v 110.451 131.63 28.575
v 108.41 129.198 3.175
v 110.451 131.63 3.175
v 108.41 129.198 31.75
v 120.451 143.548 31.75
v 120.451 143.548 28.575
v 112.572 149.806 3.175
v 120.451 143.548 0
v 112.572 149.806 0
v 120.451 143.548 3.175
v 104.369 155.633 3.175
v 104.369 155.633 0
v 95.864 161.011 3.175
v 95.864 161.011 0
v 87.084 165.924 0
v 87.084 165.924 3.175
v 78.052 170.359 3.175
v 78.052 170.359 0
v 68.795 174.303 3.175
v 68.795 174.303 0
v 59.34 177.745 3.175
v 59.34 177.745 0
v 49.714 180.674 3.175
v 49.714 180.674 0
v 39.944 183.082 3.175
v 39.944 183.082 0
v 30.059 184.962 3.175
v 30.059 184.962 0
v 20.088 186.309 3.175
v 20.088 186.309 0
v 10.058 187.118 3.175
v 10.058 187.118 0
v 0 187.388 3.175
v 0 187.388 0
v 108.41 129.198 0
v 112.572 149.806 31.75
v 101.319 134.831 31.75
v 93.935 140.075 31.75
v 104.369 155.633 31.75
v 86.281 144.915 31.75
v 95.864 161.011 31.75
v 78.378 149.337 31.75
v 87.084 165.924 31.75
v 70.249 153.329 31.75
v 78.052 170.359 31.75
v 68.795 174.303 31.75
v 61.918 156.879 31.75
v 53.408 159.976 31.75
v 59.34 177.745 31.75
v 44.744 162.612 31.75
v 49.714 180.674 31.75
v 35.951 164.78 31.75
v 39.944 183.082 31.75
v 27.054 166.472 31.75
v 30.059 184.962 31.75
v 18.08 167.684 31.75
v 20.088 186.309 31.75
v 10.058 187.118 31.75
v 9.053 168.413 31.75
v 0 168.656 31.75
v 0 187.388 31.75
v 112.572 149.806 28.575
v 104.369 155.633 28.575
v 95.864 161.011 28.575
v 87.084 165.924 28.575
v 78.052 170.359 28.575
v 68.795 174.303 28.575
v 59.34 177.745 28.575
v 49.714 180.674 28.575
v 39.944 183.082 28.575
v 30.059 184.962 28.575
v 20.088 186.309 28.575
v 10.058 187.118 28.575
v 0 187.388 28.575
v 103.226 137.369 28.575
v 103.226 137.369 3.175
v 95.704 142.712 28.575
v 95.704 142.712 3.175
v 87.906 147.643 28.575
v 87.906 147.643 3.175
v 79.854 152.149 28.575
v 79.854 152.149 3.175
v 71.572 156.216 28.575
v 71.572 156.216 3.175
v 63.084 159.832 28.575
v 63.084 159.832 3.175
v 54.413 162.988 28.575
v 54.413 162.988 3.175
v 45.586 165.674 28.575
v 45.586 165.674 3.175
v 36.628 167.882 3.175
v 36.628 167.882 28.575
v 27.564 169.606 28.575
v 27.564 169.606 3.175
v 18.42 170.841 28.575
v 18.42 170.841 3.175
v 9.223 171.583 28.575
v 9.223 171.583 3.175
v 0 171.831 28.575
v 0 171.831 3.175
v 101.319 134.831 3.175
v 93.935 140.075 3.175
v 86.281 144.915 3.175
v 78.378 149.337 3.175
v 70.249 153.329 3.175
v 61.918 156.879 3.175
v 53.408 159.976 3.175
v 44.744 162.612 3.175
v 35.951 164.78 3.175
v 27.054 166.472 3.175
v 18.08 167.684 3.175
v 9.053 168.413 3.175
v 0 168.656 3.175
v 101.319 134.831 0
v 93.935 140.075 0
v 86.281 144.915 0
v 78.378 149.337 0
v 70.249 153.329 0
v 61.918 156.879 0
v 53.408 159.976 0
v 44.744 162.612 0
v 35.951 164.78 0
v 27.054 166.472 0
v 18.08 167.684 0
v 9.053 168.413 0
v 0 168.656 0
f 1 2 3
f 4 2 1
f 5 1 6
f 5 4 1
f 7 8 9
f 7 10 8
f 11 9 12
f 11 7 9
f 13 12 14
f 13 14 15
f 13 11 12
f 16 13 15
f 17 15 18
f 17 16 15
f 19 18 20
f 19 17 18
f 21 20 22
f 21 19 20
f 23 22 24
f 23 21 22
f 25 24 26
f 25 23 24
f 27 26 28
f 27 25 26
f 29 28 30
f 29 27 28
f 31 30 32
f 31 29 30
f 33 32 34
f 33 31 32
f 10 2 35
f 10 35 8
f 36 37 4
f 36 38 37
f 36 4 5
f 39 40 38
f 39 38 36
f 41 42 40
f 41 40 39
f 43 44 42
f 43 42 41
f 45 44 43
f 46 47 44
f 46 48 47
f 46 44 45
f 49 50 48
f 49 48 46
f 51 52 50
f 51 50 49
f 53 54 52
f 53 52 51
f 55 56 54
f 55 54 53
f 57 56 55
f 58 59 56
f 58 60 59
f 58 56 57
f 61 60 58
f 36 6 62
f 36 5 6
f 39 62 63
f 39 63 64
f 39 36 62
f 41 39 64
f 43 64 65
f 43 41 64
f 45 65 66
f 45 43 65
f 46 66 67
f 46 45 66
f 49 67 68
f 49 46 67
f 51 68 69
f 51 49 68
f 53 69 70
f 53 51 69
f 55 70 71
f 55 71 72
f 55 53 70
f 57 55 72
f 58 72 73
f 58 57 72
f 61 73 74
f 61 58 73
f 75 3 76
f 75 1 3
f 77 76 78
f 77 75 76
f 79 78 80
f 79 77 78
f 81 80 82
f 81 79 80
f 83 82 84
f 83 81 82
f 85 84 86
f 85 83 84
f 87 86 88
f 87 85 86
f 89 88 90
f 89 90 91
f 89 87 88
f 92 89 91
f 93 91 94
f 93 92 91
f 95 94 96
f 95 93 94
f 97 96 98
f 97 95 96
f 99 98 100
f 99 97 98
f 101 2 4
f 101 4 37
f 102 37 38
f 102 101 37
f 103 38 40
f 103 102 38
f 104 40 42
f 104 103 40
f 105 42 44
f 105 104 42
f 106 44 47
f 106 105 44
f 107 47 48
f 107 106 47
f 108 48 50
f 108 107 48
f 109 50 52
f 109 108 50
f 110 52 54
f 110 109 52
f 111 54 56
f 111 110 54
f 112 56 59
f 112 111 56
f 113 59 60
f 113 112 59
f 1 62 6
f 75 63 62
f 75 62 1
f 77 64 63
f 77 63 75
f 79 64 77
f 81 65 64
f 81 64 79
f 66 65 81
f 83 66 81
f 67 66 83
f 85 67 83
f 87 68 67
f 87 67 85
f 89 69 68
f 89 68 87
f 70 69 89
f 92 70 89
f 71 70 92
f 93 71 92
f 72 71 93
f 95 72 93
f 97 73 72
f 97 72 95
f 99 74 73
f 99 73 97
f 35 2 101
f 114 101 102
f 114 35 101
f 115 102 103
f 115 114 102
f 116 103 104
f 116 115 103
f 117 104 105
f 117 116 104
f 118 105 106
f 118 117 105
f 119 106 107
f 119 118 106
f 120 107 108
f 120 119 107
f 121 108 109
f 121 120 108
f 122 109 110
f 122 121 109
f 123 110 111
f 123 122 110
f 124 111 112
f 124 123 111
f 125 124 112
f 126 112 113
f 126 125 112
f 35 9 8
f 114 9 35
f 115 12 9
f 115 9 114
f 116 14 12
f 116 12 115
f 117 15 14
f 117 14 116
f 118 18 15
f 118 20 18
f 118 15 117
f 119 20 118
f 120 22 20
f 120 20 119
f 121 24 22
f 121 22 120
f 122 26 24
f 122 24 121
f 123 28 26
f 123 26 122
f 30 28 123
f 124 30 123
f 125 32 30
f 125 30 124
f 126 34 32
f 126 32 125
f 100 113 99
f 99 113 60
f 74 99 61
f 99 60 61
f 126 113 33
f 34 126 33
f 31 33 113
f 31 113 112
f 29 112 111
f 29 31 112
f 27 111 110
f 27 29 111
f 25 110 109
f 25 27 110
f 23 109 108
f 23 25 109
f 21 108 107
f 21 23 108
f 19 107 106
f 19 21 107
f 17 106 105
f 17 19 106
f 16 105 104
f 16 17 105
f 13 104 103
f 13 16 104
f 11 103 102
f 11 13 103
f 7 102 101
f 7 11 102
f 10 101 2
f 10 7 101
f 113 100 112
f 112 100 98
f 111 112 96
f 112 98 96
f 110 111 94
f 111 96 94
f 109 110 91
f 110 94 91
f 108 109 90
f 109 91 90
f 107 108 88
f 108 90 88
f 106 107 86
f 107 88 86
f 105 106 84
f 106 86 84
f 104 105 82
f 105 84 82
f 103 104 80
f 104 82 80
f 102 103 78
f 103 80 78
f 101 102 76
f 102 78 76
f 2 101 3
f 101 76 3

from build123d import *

# Parameters (mm, degrees)
STOCK_BEARINGHOLDER_1_ANGLE = 40


# Read off the part's stored shape, not the designer's step: Stock-BearingHolder-1
with BuildPart() as part:
    # Stock-BearingHolder-1 outline → Stock-BearingHolder-1 (revolve)
    with BuildSketch(Plane(origin=(0, 0, 0), x_dir=(0.6427876096865552, 0.7660444431189647, 0), z_dir=(0.7660444431189647, -0.6427876096865552, 0))):
        Polygon((168.656, 31.75), (168.656, 0), (187.3885, 0), (187.3885, 3.175), (171.831, 3.175), (171.831, 28.575), (187.3885, 28.575), (187.3885, 31.75), align=None)
    revolve(axis=Axis((0, 0, 0), (0, 0, 1)), revolution_arc=STOCK_BEARINGHOLDER_1_ANGLE)


with BuildPart() as body_2:
    # Split1: the piece on the far side of the plane
    add(part.part)
    split(bisect_by=Plane.XY.offset(3.175), keep=Keep.BOTTOM)


with BuildPart() as part_1:
    add(part.part)

    # Split1
    split(bisect_by=Plane.XY.offset(3.175), keep=Keep.TOP)


solid = Compound([body_2.part, part_1.part])
